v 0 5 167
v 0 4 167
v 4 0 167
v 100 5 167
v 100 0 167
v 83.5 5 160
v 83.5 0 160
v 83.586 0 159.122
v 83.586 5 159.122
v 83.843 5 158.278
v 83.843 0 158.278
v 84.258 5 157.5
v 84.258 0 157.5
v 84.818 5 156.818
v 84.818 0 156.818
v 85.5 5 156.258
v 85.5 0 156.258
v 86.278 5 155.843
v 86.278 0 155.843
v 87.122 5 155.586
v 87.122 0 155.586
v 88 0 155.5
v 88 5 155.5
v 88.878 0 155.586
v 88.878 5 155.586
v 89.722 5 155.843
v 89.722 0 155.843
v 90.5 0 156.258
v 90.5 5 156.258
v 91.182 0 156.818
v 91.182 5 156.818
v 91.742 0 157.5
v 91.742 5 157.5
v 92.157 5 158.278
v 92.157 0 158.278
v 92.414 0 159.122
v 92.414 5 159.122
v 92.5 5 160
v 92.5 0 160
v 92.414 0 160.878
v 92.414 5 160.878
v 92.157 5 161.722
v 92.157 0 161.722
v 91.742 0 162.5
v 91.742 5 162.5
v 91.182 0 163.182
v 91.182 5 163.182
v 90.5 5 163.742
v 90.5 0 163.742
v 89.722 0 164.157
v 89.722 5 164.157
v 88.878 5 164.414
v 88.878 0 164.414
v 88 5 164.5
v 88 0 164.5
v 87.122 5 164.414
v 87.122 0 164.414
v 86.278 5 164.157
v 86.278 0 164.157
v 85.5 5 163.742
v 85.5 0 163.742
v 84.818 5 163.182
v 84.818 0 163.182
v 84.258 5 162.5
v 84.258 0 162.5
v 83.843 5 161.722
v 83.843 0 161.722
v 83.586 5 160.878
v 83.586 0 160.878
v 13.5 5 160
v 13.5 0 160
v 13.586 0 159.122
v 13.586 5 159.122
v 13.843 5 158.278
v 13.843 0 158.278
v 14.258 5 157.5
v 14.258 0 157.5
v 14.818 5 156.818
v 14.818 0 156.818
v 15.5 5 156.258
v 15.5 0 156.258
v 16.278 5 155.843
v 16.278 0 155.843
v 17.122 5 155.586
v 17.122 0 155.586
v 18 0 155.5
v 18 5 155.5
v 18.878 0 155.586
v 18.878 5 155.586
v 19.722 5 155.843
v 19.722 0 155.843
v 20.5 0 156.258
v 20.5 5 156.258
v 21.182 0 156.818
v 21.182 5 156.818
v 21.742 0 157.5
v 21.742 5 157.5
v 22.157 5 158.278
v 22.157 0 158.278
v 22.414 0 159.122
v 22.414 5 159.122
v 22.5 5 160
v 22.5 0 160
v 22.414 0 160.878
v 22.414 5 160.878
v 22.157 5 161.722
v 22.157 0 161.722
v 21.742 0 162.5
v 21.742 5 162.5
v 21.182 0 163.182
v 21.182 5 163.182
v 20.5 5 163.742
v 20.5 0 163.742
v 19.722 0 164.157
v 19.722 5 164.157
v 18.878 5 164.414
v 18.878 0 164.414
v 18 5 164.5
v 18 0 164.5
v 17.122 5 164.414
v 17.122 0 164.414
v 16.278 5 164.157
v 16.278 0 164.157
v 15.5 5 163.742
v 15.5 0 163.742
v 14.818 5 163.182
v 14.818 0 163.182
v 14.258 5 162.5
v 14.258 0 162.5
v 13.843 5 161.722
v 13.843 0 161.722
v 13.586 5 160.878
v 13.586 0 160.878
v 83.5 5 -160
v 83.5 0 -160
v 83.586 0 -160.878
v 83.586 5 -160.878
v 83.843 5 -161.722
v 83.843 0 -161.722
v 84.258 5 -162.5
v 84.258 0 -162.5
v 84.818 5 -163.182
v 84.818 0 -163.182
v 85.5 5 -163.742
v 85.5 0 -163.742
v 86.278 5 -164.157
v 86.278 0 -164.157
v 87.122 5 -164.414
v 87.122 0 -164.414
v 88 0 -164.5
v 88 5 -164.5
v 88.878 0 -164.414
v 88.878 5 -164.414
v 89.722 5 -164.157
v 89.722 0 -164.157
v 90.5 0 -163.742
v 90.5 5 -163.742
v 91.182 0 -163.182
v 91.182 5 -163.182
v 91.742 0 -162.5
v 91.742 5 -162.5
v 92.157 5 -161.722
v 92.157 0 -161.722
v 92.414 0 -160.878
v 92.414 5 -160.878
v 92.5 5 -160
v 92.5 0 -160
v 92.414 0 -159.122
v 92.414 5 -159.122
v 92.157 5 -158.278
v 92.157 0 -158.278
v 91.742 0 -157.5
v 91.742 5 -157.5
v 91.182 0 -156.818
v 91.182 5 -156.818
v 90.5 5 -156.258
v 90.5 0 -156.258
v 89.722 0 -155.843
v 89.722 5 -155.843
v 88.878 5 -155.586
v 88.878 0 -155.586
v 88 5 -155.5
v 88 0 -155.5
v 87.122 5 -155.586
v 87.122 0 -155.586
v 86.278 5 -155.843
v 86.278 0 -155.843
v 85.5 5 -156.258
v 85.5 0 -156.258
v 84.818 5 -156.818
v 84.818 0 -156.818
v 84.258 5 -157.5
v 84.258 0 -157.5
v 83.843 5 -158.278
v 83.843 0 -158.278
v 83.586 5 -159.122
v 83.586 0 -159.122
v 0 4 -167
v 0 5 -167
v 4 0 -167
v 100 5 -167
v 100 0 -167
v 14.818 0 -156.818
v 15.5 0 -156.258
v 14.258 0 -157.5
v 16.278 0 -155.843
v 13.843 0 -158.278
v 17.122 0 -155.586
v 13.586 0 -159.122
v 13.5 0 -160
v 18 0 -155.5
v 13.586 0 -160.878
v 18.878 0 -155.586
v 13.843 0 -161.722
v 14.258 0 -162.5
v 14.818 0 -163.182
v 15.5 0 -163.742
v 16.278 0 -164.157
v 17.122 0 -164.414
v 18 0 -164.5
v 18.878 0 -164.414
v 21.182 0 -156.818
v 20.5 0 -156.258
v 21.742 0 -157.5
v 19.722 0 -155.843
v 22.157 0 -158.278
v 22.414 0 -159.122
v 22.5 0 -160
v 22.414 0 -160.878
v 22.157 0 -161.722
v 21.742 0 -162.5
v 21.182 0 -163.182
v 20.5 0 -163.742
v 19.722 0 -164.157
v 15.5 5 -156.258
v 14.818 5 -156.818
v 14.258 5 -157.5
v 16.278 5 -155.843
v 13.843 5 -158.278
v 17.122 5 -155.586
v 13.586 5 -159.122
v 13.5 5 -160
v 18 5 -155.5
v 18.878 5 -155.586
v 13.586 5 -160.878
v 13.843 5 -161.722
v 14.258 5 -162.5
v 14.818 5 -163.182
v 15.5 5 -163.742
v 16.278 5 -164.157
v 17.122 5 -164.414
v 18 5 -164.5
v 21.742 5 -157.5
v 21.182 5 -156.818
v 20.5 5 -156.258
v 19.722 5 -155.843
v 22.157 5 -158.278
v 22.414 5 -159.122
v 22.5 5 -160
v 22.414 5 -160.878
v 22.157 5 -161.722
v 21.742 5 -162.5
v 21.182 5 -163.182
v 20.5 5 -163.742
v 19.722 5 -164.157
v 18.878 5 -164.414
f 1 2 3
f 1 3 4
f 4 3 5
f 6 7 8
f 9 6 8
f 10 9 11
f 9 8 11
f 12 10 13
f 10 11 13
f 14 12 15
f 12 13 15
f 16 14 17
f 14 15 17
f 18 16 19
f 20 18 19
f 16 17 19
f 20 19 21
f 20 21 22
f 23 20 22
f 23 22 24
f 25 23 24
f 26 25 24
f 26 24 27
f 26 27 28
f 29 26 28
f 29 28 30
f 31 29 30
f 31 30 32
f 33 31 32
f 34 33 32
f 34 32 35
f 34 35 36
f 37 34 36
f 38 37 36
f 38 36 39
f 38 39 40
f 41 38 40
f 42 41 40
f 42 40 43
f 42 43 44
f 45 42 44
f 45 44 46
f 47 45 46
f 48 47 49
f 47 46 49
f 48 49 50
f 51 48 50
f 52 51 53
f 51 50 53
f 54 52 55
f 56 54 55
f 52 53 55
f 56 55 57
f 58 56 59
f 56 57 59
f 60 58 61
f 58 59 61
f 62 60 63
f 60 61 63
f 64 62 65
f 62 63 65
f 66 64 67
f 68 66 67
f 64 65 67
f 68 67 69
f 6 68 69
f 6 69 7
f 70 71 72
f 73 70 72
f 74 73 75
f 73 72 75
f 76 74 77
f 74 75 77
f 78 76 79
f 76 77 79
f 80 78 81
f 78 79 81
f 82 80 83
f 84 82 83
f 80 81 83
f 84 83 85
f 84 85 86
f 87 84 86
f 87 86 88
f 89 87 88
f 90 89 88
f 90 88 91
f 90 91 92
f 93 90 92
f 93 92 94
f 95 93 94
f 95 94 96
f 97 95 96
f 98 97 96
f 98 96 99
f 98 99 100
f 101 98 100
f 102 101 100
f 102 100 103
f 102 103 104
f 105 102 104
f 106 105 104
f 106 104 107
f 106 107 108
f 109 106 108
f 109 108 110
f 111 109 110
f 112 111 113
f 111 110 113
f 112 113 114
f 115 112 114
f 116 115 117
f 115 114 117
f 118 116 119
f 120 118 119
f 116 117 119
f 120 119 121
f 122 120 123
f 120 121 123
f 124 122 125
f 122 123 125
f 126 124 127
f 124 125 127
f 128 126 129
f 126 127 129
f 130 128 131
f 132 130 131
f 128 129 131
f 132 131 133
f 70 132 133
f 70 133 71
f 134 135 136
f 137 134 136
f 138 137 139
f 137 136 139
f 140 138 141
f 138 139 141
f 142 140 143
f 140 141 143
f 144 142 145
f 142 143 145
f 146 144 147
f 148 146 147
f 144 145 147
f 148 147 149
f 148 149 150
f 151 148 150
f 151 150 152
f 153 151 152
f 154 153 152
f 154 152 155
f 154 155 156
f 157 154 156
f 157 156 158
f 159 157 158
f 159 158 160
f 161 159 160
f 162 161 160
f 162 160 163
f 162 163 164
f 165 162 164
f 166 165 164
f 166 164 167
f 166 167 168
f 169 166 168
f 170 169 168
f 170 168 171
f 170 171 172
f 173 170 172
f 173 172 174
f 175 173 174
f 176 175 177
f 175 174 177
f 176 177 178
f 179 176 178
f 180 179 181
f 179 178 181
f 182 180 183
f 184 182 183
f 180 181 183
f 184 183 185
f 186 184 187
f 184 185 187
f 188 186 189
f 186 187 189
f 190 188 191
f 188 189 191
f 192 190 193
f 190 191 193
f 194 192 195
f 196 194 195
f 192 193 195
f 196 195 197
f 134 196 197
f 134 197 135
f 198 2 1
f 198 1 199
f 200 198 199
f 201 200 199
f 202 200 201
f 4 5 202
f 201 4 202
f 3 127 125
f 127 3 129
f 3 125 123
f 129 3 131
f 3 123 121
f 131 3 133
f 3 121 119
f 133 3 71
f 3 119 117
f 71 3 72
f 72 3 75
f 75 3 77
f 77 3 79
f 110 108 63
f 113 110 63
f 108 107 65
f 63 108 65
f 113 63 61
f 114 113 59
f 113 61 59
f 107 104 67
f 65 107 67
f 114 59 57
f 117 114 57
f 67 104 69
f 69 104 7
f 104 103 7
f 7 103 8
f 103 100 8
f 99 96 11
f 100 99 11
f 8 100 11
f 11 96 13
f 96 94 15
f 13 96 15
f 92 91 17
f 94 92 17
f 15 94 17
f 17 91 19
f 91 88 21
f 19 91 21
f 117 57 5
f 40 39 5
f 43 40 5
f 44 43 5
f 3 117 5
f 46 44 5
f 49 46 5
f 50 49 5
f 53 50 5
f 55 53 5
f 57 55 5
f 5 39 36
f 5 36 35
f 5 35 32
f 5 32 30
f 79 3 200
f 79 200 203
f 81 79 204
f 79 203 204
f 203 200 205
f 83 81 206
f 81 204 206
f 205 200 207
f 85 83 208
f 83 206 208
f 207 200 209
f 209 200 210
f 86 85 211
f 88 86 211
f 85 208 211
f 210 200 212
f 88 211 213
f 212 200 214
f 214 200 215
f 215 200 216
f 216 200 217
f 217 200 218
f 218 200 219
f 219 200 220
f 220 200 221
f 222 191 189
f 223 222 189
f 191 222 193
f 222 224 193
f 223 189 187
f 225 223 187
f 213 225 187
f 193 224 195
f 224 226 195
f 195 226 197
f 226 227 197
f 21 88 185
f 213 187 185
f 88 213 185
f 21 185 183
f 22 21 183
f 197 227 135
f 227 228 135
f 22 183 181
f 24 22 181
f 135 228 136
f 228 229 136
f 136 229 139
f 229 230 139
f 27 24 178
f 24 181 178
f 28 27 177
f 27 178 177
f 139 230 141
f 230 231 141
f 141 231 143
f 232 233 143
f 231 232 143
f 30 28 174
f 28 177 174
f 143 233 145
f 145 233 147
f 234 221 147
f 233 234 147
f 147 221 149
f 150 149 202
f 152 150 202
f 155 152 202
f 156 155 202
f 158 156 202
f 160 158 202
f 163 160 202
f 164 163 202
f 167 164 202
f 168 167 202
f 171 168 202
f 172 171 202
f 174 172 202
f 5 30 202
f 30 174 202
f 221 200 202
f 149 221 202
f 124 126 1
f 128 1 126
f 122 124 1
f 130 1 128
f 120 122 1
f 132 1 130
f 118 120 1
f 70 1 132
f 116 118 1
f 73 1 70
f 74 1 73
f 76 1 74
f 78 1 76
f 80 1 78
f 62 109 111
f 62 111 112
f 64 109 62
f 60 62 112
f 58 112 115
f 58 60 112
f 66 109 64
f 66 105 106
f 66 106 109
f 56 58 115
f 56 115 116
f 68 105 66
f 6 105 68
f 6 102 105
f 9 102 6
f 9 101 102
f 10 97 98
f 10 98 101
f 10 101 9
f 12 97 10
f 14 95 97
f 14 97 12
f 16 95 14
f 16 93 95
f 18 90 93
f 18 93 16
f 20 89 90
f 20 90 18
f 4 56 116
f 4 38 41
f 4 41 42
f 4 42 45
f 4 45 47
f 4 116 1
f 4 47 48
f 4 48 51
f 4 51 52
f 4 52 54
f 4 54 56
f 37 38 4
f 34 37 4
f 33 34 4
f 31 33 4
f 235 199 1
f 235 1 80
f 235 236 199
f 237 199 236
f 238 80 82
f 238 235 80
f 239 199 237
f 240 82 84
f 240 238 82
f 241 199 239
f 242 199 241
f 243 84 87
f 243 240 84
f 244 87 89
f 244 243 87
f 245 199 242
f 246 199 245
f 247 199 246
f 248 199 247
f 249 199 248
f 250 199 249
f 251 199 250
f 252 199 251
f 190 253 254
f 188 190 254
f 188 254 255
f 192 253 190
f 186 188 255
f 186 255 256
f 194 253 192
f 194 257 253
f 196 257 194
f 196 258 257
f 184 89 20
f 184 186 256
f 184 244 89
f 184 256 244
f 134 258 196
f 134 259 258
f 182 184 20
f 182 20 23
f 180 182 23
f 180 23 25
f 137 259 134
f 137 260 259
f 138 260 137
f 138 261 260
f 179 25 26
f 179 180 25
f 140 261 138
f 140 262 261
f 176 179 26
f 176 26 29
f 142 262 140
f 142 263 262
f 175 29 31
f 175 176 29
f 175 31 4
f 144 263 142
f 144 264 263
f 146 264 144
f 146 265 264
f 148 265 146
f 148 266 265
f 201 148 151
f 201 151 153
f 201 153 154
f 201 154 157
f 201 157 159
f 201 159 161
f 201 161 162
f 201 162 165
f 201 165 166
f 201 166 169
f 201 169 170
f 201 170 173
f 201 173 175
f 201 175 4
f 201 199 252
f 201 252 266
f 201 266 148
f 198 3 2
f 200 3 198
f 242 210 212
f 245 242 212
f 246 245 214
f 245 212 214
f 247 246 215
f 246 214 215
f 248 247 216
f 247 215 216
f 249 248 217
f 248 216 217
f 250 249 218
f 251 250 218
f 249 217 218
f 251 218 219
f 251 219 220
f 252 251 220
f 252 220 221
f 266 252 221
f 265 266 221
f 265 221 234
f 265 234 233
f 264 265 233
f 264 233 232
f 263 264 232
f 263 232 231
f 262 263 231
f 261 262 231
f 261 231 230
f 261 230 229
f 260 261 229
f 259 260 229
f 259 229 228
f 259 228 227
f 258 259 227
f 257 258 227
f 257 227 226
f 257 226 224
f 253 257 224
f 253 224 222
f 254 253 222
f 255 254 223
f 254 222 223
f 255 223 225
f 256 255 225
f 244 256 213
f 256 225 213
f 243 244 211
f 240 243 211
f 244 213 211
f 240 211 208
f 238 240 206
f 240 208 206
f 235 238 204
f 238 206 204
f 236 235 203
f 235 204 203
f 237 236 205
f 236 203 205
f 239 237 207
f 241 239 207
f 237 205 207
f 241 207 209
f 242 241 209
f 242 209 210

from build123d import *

# Parameters (mm, degrees)
SKIZZE10_W                      = 100
SKIZZE10_H                      = 334
AUFSATZ_LINEAR_AUSTRAGEN1_DEPTH = 5
FASE1_SIZE                      = 4
DURCHGANGSLOCH_F_R_M81_D        = 9


with BuildPart() as part:
    # Skizze10 → Aufsatz-Linear austragen1 (new body)
    with BuildSketch(Plane(origin=(0, 0, 0), x_dir=(1, 0, 0), z_dir=(0, 1, 0))):
        with Locations((50, 0)):
            Rectangle(SKIZZE10_W, SKIZZE10_H)
    extrude(amount=AUFSATZ_LINEAR_AUSTRAGEN1_DEPTH)

    # Fase1
    fase1_edges = [part.edges().sort_by_distance(p)[0] for p in [
        (0, 0, 0),
    ]]
    chamfer(fase1_edges, length=FASE1_SIZE)

    # Durchgangsloch für M81 (through all)
    with Locations(Plane(origin=(0, 5, 0), x_dir=(1, 0, 0), z_dir=(0, 1, 0))):
        with Locations((18, -160), (18, 160), (88, -160), (88, 160)):
            Hole(DURCHGANGSLOCH_F_R_M81_D / 2)


solid = part.part
